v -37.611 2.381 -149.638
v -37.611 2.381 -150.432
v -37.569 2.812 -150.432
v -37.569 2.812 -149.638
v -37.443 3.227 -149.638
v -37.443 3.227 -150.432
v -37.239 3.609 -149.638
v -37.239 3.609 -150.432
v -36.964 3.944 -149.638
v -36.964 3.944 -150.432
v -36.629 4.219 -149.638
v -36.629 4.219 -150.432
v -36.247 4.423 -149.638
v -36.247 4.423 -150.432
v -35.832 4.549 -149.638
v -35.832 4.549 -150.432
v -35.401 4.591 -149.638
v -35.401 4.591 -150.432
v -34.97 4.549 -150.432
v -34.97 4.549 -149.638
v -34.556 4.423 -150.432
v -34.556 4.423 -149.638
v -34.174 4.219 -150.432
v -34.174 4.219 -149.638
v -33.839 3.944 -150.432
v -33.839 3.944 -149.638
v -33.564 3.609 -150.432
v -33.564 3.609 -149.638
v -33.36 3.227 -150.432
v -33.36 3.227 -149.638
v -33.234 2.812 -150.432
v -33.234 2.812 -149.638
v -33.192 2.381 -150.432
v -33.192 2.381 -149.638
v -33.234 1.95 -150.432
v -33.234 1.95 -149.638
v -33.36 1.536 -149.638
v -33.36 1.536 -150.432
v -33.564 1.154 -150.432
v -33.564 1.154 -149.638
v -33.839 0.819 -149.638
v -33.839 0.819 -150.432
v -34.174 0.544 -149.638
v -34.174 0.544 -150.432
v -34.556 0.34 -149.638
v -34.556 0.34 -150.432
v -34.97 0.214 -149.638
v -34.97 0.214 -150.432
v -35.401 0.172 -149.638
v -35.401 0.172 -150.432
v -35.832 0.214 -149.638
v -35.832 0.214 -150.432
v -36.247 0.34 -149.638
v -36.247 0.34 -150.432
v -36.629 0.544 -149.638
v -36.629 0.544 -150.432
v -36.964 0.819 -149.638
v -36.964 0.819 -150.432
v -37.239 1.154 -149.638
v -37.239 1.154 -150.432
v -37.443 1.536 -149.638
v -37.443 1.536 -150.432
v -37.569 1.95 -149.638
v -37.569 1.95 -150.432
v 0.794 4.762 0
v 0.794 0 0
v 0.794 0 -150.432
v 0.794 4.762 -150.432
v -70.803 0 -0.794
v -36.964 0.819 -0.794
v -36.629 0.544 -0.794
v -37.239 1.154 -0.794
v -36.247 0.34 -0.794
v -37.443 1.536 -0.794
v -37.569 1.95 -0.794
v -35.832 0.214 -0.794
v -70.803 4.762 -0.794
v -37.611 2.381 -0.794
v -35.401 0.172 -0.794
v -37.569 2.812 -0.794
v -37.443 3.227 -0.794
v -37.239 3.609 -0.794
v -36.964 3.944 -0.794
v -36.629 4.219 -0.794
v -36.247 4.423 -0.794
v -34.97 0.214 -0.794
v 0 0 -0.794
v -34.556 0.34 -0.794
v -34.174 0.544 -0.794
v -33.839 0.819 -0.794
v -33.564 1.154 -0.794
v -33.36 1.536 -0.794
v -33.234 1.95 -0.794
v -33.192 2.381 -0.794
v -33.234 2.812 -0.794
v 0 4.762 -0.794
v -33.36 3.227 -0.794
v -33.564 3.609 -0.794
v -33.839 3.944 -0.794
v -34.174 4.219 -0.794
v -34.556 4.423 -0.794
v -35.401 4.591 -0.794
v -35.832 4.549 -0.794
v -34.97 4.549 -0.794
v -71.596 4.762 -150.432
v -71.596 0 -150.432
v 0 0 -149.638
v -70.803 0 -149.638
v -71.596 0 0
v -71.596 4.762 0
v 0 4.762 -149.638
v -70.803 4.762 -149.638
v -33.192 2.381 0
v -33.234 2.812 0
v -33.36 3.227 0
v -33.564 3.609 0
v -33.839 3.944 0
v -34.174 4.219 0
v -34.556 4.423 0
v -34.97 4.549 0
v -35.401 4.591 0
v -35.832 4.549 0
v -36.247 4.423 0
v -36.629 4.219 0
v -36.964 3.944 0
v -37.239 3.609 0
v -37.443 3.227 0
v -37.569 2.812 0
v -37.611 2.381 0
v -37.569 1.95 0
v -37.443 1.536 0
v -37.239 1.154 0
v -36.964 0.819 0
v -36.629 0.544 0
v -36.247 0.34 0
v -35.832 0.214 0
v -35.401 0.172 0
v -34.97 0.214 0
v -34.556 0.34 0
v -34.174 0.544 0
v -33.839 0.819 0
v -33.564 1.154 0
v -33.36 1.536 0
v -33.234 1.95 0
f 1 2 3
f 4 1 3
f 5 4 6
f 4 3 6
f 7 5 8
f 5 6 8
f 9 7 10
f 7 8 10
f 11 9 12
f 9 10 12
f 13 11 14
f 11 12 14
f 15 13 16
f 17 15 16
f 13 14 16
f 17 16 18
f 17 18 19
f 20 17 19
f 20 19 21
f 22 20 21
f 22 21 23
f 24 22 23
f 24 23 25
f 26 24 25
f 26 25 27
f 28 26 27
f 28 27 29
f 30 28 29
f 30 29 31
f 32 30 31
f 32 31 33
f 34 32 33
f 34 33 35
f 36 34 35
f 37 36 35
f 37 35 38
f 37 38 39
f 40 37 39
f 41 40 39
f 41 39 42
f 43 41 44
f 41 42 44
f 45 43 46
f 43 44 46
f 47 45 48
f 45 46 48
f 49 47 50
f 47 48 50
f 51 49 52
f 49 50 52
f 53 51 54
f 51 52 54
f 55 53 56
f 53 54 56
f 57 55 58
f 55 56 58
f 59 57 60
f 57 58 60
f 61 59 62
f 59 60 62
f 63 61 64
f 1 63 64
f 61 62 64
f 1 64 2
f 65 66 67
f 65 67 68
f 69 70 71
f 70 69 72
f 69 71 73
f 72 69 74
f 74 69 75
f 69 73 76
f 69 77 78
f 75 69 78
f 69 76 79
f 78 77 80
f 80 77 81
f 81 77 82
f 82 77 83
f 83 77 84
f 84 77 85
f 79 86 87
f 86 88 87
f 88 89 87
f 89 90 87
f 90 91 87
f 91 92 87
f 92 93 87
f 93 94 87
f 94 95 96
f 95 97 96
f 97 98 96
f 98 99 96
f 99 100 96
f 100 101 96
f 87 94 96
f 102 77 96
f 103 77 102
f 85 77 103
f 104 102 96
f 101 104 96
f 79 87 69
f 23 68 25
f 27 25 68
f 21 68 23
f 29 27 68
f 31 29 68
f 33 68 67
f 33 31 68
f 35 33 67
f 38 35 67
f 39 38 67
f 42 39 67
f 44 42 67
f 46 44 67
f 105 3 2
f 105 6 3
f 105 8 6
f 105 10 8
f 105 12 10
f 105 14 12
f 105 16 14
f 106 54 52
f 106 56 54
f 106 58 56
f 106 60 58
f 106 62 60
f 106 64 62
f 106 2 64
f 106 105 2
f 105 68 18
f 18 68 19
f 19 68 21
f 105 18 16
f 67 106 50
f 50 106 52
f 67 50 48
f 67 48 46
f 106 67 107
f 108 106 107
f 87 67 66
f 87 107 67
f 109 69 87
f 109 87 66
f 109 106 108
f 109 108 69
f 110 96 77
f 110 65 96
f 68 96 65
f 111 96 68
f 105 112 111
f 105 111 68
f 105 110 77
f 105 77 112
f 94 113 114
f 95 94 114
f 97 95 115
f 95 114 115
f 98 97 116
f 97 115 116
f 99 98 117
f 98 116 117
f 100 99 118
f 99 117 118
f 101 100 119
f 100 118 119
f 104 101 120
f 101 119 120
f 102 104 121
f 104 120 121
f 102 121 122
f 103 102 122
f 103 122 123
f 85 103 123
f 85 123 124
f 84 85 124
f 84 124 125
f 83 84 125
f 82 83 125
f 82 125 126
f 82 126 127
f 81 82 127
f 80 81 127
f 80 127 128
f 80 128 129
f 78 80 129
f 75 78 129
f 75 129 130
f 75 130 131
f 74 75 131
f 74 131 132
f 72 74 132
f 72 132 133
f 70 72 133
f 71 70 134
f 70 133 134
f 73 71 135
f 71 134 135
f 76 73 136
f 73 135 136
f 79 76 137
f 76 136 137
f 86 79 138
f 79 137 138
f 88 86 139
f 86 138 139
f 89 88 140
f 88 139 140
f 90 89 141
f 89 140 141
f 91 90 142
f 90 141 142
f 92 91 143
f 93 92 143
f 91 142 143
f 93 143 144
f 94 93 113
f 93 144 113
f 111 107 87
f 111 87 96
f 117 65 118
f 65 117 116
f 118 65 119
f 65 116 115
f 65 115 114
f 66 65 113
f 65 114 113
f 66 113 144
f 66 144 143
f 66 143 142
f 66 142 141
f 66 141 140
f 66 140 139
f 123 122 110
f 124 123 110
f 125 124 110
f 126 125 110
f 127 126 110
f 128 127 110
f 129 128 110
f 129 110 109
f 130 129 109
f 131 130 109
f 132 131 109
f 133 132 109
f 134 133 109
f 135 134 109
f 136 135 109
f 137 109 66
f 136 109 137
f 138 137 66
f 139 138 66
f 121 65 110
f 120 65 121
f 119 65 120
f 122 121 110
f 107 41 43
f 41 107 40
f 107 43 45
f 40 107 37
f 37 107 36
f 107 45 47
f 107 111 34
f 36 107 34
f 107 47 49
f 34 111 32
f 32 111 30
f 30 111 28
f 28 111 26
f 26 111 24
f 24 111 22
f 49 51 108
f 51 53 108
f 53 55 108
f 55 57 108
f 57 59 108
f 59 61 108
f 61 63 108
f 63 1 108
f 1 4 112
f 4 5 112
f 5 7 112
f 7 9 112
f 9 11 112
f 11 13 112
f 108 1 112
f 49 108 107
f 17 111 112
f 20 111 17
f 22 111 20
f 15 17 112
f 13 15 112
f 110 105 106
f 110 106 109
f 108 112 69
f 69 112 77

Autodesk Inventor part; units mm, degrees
ref_plane "YZ Plane" through (0, 0, 0) normal (1, 0, 0) x (0, 1, 0)
ref_plane "XZ Plane" through (0, 0, 0) normal (0, 1, 0) x (-1, 0, 0)
ref_plane "XY Plane" through (0, 0, 0) normal (0, 0, 1) x (1, 0, 0)
sketch "Sketch1" plane through (0, 0, 0) normal (1, 0, 0) x (0, 1, 0)
  line L0 (0, 0) -> (4.7625, 0)
  line L1 (4.7625, 0) -> (4.7625, -150.4315)
  line L2 (4.7625, -150.4315) -> (0, -150.4315)
  line L3 (0, -150.4315) -> (0, 0)
  dimension "d1" = 4.7625
  dimension "d2" = 150.4315
extrude "Extrusion1" add sketch "Sketch1" along normal blind 0.7937
sketch "Sketch2" plane through (0, 0, -150.4315) normal (0, 0, -1) x (-1, 0, 0)
  line L0 (-0.7937, 0) -> (-0.7937, 4.7625) projected
  line L1 (-0.7937, 0) -> (71.5963, 0)
  line L2 (71.5963, 0) -> (71.5963, 4.7625)
  line L3 (71.5963, 4.7625) -> (-0.7937, 4.7625)
  line L4 (-0.7937, 4.7625) -> (-0.7937, 0)
  point P0 (0, 0)
  dimension "d5" = 72.39
  dimension "d6" = 4.7625
extrude "Extrusion2" add sketch "Sketch2" against normal blind 0.7937
sketch "Sketch3" plane through (-71.5963, 0, -150.4315) normal (-1, 0, 0) x (0, 0, 1)
  line L0 (150.4315, 4.7625) -> (150.4315, 0) projected
  line L1 (0, 0) -> (150.4315, 0)
  line L2 (150.4315, 0) -> (150.4315, 4.7625)
  line L3 (150.4315, 4.7625) -> (0, 4.7625)
  line L4 (0, 4.7625) -> (0, 0)
extrude "Extrusion3" add sketch "Sketch3" against normal blind 0.7937
sketch "Sketch4" plane through (-71.5963, 0, 0) normal (0, 0, 1) x (1, 0, 0)
  line L0 (0, 0) -> (0, 4.7625) projected
  line L1 (71.5963, 4.7625) -> (72.39, 4.7625) projected
  line L2 (0, 0) -> (72.39, 0)
  line L3 (72.39, 0) -> (72.39, 4.7625)
  line L4 (72.39, 4.7625) -> (0, 4.7625)
  line L5 (0, 4.7625) -> (0, 0)
  point P0 (71.5963, 0)
  point P1 (71.5963, 4.7625)
extrude "Extrusion4" add sketch "Sketch4" against normal blind 0.7937
sketch "Sketch5" plane through (0.7937, 0, 0) normal (0, 0, 1) x (1, 0, 0)
  circle A0 centre (-36.195, 2.3813) radius 2.2098
extrude "Extrusion5" cut sketch "Sketch5" against normal blind 0.7937
sketch "Sketch6" plane through (0.7937, 0, -150.4315) normal (0, 0, -1) x (-1, 0, 0)
  circle A0 centre (36.195, 2.3813) radius 2.2098
  point P0 (0, 0)
  point P1 (72.39, 0)
extrude "Extrusion6" cut sketch "Sketch6" against normal blind 0.7937
properties part number "Back rubber bands"
